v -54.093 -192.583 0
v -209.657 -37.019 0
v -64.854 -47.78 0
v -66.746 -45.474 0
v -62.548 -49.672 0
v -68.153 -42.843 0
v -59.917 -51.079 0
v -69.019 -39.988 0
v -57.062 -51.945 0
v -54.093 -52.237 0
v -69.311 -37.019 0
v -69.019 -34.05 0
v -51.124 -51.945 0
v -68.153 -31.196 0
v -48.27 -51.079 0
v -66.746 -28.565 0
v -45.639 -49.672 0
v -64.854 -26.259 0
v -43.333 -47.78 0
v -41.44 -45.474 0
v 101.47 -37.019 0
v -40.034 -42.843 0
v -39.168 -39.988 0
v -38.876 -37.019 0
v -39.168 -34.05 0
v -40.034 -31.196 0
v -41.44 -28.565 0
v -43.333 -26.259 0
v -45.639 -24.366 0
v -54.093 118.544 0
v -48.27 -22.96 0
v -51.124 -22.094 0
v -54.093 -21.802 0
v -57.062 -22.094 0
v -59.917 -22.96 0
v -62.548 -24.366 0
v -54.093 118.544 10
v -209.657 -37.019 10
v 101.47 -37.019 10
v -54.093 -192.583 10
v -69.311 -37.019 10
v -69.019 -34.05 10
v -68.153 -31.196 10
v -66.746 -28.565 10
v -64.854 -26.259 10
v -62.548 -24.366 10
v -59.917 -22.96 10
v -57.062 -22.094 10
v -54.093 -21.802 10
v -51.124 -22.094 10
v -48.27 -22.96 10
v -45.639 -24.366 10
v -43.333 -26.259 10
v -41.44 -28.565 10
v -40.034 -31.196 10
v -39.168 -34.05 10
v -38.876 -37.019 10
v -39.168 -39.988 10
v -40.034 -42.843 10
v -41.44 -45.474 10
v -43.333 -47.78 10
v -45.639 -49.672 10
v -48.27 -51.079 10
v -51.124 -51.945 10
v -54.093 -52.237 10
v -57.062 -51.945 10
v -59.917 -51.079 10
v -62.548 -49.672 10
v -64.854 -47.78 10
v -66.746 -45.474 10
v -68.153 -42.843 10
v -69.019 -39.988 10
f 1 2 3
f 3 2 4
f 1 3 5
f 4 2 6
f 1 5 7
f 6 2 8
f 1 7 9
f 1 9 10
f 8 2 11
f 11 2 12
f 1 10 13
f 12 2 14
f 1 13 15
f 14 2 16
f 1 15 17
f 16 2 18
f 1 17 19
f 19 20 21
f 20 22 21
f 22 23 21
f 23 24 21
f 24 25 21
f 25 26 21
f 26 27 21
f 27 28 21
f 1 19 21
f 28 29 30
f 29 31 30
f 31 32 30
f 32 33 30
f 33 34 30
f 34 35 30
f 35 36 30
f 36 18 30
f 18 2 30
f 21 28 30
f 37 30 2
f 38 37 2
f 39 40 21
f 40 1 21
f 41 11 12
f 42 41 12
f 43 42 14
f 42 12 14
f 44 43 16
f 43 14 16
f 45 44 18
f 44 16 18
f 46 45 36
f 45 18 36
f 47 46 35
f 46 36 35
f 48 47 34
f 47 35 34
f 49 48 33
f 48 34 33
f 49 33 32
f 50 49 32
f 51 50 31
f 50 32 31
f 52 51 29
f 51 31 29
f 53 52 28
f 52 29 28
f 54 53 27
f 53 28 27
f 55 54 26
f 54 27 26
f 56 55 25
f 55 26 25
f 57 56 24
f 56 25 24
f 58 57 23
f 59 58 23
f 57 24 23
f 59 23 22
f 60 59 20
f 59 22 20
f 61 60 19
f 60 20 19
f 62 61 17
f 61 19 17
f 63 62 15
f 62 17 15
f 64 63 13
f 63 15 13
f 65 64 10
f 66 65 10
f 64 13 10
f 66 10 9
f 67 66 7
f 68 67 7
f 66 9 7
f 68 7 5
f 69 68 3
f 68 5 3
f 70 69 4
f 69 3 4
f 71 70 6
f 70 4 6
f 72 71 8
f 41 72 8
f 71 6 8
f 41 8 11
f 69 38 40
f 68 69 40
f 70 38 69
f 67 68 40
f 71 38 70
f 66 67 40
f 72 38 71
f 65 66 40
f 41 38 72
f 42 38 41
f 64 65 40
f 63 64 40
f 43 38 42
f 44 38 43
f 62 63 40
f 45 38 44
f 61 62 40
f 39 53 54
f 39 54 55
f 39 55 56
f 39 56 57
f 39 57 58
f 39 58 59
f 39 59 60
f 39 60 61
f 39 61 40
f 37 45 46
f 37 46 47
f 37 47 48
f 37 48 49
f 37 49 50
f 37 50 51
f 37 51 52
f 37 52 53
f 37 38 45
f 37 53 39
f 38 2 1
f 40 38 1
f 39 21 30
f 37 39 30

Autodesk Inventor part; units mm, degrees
ref_plane "YZ Plane" through (0, 0, 0) normal (1, 0, 0) x (0, 1, 0)
ref_plane "XZ Plane" through (0, 0, 0) normal (0, 1, 0) x (-1, 0, 0)
ref_plane "XY Plane" through (0, 0, 0) normal (0, 0, 1) x (1, 0, 0)
sketch "Sketch1" plane through (0, 0, 0) normal (0, 0, 1) x (1, 0, 0)
  line L0 (-46.0933, 91.1044) -> (-62.0933, 91.1044) projected
  line L1 (-54.0933, 118.5442) -> (-209.6568, -37.0193)
  line L2 (-209.6568, -37.0193) -> (-54.0933, -192.5828)
  line L3 (-54.0933, -192.5828) -> (101.4702, -37.0193)
  line L4 (101.4702, -37.0193) -> (-54.0933, 118.5442)
  line L5 (-54.0933, 91.1044) -> (165.9067, 91.1044) construction
  line L6 (-25.3821, 79.8544) -> (-25.3821, 89.8544)
  line L7 (-82.7831, 89.8544) -> (-82.7831, 79.8544) projected
  line L8 (-54.0933, 91.1044) -> (-54.0933, 151.1044)
  line L9 (-82.7831, 89.8544) -> (-54.0933, 118.5442)
  line L10 (-82.7831, 89.8544) -> (-42.2096, 89.8544) construction
  point P0 (0, 0)
  dimension "d0" = 220
  dimension "d1" = 135
  dimension "d2" = 220
  dimension "d3" = 60
  dimension "d4" = 45
extrude "Extrusion1" add sketch "Sketch1" along normal blind 10
sketch "Sketch2" plane through (0, 0, 0) normal (0, 0, -1) x (-1, 0, 0)
  line L0 (209.6568, -37.0193) -> (54.0933, -192.5828) projected
  line L1 (54.0933, 118.5442) -> (209.6568, -37.0193) projected
  line L2 (-101.4702, -37.0193) -> (54.0933, 118.5442) projected
  line L3 (54.0933, -192.5828) -> (-101.4702, -37.0193) projected
  line L4 (-101.4702, -37.0193) -> (209.6568, -37.0193)
  line L5 (54.0933, -192.5828) -> (54.0933, 118.5442)
  line L6 (74.0933, -3.2956) -> (34.0933, -3.2956) projected
  line L7 (34.0933, 39.0692) -> (74.0933, 39.0692)
  line L8 (74.0933, 39.0692) -> (74.0933, -3.2956)
  line L9 (74.0933, -3.2956) -> (34.0933, -3.2956)
  line L10 (34.0933, -3.2956) -> (34.0933, 39.0692)
  point P0 (0, 0)
sketch "Sketch3" plane through (0, 0, 0) normal (0, 0, -1) x (-1, 0, 0)
  line L0 (-101.4702, -37.0193) -> (209.6568, -37.0193) projected
  line L1 (54.0933, -192.5828) -> (54.0933, 118.5442) projected
  circle A0 centre (54.0933, -37.0193) radius 15.2178
  point P0 (0, 0)
extrude "Extrusion2" cut sketch "Sketch3" against normal blind 10
properties part number "Template220"
